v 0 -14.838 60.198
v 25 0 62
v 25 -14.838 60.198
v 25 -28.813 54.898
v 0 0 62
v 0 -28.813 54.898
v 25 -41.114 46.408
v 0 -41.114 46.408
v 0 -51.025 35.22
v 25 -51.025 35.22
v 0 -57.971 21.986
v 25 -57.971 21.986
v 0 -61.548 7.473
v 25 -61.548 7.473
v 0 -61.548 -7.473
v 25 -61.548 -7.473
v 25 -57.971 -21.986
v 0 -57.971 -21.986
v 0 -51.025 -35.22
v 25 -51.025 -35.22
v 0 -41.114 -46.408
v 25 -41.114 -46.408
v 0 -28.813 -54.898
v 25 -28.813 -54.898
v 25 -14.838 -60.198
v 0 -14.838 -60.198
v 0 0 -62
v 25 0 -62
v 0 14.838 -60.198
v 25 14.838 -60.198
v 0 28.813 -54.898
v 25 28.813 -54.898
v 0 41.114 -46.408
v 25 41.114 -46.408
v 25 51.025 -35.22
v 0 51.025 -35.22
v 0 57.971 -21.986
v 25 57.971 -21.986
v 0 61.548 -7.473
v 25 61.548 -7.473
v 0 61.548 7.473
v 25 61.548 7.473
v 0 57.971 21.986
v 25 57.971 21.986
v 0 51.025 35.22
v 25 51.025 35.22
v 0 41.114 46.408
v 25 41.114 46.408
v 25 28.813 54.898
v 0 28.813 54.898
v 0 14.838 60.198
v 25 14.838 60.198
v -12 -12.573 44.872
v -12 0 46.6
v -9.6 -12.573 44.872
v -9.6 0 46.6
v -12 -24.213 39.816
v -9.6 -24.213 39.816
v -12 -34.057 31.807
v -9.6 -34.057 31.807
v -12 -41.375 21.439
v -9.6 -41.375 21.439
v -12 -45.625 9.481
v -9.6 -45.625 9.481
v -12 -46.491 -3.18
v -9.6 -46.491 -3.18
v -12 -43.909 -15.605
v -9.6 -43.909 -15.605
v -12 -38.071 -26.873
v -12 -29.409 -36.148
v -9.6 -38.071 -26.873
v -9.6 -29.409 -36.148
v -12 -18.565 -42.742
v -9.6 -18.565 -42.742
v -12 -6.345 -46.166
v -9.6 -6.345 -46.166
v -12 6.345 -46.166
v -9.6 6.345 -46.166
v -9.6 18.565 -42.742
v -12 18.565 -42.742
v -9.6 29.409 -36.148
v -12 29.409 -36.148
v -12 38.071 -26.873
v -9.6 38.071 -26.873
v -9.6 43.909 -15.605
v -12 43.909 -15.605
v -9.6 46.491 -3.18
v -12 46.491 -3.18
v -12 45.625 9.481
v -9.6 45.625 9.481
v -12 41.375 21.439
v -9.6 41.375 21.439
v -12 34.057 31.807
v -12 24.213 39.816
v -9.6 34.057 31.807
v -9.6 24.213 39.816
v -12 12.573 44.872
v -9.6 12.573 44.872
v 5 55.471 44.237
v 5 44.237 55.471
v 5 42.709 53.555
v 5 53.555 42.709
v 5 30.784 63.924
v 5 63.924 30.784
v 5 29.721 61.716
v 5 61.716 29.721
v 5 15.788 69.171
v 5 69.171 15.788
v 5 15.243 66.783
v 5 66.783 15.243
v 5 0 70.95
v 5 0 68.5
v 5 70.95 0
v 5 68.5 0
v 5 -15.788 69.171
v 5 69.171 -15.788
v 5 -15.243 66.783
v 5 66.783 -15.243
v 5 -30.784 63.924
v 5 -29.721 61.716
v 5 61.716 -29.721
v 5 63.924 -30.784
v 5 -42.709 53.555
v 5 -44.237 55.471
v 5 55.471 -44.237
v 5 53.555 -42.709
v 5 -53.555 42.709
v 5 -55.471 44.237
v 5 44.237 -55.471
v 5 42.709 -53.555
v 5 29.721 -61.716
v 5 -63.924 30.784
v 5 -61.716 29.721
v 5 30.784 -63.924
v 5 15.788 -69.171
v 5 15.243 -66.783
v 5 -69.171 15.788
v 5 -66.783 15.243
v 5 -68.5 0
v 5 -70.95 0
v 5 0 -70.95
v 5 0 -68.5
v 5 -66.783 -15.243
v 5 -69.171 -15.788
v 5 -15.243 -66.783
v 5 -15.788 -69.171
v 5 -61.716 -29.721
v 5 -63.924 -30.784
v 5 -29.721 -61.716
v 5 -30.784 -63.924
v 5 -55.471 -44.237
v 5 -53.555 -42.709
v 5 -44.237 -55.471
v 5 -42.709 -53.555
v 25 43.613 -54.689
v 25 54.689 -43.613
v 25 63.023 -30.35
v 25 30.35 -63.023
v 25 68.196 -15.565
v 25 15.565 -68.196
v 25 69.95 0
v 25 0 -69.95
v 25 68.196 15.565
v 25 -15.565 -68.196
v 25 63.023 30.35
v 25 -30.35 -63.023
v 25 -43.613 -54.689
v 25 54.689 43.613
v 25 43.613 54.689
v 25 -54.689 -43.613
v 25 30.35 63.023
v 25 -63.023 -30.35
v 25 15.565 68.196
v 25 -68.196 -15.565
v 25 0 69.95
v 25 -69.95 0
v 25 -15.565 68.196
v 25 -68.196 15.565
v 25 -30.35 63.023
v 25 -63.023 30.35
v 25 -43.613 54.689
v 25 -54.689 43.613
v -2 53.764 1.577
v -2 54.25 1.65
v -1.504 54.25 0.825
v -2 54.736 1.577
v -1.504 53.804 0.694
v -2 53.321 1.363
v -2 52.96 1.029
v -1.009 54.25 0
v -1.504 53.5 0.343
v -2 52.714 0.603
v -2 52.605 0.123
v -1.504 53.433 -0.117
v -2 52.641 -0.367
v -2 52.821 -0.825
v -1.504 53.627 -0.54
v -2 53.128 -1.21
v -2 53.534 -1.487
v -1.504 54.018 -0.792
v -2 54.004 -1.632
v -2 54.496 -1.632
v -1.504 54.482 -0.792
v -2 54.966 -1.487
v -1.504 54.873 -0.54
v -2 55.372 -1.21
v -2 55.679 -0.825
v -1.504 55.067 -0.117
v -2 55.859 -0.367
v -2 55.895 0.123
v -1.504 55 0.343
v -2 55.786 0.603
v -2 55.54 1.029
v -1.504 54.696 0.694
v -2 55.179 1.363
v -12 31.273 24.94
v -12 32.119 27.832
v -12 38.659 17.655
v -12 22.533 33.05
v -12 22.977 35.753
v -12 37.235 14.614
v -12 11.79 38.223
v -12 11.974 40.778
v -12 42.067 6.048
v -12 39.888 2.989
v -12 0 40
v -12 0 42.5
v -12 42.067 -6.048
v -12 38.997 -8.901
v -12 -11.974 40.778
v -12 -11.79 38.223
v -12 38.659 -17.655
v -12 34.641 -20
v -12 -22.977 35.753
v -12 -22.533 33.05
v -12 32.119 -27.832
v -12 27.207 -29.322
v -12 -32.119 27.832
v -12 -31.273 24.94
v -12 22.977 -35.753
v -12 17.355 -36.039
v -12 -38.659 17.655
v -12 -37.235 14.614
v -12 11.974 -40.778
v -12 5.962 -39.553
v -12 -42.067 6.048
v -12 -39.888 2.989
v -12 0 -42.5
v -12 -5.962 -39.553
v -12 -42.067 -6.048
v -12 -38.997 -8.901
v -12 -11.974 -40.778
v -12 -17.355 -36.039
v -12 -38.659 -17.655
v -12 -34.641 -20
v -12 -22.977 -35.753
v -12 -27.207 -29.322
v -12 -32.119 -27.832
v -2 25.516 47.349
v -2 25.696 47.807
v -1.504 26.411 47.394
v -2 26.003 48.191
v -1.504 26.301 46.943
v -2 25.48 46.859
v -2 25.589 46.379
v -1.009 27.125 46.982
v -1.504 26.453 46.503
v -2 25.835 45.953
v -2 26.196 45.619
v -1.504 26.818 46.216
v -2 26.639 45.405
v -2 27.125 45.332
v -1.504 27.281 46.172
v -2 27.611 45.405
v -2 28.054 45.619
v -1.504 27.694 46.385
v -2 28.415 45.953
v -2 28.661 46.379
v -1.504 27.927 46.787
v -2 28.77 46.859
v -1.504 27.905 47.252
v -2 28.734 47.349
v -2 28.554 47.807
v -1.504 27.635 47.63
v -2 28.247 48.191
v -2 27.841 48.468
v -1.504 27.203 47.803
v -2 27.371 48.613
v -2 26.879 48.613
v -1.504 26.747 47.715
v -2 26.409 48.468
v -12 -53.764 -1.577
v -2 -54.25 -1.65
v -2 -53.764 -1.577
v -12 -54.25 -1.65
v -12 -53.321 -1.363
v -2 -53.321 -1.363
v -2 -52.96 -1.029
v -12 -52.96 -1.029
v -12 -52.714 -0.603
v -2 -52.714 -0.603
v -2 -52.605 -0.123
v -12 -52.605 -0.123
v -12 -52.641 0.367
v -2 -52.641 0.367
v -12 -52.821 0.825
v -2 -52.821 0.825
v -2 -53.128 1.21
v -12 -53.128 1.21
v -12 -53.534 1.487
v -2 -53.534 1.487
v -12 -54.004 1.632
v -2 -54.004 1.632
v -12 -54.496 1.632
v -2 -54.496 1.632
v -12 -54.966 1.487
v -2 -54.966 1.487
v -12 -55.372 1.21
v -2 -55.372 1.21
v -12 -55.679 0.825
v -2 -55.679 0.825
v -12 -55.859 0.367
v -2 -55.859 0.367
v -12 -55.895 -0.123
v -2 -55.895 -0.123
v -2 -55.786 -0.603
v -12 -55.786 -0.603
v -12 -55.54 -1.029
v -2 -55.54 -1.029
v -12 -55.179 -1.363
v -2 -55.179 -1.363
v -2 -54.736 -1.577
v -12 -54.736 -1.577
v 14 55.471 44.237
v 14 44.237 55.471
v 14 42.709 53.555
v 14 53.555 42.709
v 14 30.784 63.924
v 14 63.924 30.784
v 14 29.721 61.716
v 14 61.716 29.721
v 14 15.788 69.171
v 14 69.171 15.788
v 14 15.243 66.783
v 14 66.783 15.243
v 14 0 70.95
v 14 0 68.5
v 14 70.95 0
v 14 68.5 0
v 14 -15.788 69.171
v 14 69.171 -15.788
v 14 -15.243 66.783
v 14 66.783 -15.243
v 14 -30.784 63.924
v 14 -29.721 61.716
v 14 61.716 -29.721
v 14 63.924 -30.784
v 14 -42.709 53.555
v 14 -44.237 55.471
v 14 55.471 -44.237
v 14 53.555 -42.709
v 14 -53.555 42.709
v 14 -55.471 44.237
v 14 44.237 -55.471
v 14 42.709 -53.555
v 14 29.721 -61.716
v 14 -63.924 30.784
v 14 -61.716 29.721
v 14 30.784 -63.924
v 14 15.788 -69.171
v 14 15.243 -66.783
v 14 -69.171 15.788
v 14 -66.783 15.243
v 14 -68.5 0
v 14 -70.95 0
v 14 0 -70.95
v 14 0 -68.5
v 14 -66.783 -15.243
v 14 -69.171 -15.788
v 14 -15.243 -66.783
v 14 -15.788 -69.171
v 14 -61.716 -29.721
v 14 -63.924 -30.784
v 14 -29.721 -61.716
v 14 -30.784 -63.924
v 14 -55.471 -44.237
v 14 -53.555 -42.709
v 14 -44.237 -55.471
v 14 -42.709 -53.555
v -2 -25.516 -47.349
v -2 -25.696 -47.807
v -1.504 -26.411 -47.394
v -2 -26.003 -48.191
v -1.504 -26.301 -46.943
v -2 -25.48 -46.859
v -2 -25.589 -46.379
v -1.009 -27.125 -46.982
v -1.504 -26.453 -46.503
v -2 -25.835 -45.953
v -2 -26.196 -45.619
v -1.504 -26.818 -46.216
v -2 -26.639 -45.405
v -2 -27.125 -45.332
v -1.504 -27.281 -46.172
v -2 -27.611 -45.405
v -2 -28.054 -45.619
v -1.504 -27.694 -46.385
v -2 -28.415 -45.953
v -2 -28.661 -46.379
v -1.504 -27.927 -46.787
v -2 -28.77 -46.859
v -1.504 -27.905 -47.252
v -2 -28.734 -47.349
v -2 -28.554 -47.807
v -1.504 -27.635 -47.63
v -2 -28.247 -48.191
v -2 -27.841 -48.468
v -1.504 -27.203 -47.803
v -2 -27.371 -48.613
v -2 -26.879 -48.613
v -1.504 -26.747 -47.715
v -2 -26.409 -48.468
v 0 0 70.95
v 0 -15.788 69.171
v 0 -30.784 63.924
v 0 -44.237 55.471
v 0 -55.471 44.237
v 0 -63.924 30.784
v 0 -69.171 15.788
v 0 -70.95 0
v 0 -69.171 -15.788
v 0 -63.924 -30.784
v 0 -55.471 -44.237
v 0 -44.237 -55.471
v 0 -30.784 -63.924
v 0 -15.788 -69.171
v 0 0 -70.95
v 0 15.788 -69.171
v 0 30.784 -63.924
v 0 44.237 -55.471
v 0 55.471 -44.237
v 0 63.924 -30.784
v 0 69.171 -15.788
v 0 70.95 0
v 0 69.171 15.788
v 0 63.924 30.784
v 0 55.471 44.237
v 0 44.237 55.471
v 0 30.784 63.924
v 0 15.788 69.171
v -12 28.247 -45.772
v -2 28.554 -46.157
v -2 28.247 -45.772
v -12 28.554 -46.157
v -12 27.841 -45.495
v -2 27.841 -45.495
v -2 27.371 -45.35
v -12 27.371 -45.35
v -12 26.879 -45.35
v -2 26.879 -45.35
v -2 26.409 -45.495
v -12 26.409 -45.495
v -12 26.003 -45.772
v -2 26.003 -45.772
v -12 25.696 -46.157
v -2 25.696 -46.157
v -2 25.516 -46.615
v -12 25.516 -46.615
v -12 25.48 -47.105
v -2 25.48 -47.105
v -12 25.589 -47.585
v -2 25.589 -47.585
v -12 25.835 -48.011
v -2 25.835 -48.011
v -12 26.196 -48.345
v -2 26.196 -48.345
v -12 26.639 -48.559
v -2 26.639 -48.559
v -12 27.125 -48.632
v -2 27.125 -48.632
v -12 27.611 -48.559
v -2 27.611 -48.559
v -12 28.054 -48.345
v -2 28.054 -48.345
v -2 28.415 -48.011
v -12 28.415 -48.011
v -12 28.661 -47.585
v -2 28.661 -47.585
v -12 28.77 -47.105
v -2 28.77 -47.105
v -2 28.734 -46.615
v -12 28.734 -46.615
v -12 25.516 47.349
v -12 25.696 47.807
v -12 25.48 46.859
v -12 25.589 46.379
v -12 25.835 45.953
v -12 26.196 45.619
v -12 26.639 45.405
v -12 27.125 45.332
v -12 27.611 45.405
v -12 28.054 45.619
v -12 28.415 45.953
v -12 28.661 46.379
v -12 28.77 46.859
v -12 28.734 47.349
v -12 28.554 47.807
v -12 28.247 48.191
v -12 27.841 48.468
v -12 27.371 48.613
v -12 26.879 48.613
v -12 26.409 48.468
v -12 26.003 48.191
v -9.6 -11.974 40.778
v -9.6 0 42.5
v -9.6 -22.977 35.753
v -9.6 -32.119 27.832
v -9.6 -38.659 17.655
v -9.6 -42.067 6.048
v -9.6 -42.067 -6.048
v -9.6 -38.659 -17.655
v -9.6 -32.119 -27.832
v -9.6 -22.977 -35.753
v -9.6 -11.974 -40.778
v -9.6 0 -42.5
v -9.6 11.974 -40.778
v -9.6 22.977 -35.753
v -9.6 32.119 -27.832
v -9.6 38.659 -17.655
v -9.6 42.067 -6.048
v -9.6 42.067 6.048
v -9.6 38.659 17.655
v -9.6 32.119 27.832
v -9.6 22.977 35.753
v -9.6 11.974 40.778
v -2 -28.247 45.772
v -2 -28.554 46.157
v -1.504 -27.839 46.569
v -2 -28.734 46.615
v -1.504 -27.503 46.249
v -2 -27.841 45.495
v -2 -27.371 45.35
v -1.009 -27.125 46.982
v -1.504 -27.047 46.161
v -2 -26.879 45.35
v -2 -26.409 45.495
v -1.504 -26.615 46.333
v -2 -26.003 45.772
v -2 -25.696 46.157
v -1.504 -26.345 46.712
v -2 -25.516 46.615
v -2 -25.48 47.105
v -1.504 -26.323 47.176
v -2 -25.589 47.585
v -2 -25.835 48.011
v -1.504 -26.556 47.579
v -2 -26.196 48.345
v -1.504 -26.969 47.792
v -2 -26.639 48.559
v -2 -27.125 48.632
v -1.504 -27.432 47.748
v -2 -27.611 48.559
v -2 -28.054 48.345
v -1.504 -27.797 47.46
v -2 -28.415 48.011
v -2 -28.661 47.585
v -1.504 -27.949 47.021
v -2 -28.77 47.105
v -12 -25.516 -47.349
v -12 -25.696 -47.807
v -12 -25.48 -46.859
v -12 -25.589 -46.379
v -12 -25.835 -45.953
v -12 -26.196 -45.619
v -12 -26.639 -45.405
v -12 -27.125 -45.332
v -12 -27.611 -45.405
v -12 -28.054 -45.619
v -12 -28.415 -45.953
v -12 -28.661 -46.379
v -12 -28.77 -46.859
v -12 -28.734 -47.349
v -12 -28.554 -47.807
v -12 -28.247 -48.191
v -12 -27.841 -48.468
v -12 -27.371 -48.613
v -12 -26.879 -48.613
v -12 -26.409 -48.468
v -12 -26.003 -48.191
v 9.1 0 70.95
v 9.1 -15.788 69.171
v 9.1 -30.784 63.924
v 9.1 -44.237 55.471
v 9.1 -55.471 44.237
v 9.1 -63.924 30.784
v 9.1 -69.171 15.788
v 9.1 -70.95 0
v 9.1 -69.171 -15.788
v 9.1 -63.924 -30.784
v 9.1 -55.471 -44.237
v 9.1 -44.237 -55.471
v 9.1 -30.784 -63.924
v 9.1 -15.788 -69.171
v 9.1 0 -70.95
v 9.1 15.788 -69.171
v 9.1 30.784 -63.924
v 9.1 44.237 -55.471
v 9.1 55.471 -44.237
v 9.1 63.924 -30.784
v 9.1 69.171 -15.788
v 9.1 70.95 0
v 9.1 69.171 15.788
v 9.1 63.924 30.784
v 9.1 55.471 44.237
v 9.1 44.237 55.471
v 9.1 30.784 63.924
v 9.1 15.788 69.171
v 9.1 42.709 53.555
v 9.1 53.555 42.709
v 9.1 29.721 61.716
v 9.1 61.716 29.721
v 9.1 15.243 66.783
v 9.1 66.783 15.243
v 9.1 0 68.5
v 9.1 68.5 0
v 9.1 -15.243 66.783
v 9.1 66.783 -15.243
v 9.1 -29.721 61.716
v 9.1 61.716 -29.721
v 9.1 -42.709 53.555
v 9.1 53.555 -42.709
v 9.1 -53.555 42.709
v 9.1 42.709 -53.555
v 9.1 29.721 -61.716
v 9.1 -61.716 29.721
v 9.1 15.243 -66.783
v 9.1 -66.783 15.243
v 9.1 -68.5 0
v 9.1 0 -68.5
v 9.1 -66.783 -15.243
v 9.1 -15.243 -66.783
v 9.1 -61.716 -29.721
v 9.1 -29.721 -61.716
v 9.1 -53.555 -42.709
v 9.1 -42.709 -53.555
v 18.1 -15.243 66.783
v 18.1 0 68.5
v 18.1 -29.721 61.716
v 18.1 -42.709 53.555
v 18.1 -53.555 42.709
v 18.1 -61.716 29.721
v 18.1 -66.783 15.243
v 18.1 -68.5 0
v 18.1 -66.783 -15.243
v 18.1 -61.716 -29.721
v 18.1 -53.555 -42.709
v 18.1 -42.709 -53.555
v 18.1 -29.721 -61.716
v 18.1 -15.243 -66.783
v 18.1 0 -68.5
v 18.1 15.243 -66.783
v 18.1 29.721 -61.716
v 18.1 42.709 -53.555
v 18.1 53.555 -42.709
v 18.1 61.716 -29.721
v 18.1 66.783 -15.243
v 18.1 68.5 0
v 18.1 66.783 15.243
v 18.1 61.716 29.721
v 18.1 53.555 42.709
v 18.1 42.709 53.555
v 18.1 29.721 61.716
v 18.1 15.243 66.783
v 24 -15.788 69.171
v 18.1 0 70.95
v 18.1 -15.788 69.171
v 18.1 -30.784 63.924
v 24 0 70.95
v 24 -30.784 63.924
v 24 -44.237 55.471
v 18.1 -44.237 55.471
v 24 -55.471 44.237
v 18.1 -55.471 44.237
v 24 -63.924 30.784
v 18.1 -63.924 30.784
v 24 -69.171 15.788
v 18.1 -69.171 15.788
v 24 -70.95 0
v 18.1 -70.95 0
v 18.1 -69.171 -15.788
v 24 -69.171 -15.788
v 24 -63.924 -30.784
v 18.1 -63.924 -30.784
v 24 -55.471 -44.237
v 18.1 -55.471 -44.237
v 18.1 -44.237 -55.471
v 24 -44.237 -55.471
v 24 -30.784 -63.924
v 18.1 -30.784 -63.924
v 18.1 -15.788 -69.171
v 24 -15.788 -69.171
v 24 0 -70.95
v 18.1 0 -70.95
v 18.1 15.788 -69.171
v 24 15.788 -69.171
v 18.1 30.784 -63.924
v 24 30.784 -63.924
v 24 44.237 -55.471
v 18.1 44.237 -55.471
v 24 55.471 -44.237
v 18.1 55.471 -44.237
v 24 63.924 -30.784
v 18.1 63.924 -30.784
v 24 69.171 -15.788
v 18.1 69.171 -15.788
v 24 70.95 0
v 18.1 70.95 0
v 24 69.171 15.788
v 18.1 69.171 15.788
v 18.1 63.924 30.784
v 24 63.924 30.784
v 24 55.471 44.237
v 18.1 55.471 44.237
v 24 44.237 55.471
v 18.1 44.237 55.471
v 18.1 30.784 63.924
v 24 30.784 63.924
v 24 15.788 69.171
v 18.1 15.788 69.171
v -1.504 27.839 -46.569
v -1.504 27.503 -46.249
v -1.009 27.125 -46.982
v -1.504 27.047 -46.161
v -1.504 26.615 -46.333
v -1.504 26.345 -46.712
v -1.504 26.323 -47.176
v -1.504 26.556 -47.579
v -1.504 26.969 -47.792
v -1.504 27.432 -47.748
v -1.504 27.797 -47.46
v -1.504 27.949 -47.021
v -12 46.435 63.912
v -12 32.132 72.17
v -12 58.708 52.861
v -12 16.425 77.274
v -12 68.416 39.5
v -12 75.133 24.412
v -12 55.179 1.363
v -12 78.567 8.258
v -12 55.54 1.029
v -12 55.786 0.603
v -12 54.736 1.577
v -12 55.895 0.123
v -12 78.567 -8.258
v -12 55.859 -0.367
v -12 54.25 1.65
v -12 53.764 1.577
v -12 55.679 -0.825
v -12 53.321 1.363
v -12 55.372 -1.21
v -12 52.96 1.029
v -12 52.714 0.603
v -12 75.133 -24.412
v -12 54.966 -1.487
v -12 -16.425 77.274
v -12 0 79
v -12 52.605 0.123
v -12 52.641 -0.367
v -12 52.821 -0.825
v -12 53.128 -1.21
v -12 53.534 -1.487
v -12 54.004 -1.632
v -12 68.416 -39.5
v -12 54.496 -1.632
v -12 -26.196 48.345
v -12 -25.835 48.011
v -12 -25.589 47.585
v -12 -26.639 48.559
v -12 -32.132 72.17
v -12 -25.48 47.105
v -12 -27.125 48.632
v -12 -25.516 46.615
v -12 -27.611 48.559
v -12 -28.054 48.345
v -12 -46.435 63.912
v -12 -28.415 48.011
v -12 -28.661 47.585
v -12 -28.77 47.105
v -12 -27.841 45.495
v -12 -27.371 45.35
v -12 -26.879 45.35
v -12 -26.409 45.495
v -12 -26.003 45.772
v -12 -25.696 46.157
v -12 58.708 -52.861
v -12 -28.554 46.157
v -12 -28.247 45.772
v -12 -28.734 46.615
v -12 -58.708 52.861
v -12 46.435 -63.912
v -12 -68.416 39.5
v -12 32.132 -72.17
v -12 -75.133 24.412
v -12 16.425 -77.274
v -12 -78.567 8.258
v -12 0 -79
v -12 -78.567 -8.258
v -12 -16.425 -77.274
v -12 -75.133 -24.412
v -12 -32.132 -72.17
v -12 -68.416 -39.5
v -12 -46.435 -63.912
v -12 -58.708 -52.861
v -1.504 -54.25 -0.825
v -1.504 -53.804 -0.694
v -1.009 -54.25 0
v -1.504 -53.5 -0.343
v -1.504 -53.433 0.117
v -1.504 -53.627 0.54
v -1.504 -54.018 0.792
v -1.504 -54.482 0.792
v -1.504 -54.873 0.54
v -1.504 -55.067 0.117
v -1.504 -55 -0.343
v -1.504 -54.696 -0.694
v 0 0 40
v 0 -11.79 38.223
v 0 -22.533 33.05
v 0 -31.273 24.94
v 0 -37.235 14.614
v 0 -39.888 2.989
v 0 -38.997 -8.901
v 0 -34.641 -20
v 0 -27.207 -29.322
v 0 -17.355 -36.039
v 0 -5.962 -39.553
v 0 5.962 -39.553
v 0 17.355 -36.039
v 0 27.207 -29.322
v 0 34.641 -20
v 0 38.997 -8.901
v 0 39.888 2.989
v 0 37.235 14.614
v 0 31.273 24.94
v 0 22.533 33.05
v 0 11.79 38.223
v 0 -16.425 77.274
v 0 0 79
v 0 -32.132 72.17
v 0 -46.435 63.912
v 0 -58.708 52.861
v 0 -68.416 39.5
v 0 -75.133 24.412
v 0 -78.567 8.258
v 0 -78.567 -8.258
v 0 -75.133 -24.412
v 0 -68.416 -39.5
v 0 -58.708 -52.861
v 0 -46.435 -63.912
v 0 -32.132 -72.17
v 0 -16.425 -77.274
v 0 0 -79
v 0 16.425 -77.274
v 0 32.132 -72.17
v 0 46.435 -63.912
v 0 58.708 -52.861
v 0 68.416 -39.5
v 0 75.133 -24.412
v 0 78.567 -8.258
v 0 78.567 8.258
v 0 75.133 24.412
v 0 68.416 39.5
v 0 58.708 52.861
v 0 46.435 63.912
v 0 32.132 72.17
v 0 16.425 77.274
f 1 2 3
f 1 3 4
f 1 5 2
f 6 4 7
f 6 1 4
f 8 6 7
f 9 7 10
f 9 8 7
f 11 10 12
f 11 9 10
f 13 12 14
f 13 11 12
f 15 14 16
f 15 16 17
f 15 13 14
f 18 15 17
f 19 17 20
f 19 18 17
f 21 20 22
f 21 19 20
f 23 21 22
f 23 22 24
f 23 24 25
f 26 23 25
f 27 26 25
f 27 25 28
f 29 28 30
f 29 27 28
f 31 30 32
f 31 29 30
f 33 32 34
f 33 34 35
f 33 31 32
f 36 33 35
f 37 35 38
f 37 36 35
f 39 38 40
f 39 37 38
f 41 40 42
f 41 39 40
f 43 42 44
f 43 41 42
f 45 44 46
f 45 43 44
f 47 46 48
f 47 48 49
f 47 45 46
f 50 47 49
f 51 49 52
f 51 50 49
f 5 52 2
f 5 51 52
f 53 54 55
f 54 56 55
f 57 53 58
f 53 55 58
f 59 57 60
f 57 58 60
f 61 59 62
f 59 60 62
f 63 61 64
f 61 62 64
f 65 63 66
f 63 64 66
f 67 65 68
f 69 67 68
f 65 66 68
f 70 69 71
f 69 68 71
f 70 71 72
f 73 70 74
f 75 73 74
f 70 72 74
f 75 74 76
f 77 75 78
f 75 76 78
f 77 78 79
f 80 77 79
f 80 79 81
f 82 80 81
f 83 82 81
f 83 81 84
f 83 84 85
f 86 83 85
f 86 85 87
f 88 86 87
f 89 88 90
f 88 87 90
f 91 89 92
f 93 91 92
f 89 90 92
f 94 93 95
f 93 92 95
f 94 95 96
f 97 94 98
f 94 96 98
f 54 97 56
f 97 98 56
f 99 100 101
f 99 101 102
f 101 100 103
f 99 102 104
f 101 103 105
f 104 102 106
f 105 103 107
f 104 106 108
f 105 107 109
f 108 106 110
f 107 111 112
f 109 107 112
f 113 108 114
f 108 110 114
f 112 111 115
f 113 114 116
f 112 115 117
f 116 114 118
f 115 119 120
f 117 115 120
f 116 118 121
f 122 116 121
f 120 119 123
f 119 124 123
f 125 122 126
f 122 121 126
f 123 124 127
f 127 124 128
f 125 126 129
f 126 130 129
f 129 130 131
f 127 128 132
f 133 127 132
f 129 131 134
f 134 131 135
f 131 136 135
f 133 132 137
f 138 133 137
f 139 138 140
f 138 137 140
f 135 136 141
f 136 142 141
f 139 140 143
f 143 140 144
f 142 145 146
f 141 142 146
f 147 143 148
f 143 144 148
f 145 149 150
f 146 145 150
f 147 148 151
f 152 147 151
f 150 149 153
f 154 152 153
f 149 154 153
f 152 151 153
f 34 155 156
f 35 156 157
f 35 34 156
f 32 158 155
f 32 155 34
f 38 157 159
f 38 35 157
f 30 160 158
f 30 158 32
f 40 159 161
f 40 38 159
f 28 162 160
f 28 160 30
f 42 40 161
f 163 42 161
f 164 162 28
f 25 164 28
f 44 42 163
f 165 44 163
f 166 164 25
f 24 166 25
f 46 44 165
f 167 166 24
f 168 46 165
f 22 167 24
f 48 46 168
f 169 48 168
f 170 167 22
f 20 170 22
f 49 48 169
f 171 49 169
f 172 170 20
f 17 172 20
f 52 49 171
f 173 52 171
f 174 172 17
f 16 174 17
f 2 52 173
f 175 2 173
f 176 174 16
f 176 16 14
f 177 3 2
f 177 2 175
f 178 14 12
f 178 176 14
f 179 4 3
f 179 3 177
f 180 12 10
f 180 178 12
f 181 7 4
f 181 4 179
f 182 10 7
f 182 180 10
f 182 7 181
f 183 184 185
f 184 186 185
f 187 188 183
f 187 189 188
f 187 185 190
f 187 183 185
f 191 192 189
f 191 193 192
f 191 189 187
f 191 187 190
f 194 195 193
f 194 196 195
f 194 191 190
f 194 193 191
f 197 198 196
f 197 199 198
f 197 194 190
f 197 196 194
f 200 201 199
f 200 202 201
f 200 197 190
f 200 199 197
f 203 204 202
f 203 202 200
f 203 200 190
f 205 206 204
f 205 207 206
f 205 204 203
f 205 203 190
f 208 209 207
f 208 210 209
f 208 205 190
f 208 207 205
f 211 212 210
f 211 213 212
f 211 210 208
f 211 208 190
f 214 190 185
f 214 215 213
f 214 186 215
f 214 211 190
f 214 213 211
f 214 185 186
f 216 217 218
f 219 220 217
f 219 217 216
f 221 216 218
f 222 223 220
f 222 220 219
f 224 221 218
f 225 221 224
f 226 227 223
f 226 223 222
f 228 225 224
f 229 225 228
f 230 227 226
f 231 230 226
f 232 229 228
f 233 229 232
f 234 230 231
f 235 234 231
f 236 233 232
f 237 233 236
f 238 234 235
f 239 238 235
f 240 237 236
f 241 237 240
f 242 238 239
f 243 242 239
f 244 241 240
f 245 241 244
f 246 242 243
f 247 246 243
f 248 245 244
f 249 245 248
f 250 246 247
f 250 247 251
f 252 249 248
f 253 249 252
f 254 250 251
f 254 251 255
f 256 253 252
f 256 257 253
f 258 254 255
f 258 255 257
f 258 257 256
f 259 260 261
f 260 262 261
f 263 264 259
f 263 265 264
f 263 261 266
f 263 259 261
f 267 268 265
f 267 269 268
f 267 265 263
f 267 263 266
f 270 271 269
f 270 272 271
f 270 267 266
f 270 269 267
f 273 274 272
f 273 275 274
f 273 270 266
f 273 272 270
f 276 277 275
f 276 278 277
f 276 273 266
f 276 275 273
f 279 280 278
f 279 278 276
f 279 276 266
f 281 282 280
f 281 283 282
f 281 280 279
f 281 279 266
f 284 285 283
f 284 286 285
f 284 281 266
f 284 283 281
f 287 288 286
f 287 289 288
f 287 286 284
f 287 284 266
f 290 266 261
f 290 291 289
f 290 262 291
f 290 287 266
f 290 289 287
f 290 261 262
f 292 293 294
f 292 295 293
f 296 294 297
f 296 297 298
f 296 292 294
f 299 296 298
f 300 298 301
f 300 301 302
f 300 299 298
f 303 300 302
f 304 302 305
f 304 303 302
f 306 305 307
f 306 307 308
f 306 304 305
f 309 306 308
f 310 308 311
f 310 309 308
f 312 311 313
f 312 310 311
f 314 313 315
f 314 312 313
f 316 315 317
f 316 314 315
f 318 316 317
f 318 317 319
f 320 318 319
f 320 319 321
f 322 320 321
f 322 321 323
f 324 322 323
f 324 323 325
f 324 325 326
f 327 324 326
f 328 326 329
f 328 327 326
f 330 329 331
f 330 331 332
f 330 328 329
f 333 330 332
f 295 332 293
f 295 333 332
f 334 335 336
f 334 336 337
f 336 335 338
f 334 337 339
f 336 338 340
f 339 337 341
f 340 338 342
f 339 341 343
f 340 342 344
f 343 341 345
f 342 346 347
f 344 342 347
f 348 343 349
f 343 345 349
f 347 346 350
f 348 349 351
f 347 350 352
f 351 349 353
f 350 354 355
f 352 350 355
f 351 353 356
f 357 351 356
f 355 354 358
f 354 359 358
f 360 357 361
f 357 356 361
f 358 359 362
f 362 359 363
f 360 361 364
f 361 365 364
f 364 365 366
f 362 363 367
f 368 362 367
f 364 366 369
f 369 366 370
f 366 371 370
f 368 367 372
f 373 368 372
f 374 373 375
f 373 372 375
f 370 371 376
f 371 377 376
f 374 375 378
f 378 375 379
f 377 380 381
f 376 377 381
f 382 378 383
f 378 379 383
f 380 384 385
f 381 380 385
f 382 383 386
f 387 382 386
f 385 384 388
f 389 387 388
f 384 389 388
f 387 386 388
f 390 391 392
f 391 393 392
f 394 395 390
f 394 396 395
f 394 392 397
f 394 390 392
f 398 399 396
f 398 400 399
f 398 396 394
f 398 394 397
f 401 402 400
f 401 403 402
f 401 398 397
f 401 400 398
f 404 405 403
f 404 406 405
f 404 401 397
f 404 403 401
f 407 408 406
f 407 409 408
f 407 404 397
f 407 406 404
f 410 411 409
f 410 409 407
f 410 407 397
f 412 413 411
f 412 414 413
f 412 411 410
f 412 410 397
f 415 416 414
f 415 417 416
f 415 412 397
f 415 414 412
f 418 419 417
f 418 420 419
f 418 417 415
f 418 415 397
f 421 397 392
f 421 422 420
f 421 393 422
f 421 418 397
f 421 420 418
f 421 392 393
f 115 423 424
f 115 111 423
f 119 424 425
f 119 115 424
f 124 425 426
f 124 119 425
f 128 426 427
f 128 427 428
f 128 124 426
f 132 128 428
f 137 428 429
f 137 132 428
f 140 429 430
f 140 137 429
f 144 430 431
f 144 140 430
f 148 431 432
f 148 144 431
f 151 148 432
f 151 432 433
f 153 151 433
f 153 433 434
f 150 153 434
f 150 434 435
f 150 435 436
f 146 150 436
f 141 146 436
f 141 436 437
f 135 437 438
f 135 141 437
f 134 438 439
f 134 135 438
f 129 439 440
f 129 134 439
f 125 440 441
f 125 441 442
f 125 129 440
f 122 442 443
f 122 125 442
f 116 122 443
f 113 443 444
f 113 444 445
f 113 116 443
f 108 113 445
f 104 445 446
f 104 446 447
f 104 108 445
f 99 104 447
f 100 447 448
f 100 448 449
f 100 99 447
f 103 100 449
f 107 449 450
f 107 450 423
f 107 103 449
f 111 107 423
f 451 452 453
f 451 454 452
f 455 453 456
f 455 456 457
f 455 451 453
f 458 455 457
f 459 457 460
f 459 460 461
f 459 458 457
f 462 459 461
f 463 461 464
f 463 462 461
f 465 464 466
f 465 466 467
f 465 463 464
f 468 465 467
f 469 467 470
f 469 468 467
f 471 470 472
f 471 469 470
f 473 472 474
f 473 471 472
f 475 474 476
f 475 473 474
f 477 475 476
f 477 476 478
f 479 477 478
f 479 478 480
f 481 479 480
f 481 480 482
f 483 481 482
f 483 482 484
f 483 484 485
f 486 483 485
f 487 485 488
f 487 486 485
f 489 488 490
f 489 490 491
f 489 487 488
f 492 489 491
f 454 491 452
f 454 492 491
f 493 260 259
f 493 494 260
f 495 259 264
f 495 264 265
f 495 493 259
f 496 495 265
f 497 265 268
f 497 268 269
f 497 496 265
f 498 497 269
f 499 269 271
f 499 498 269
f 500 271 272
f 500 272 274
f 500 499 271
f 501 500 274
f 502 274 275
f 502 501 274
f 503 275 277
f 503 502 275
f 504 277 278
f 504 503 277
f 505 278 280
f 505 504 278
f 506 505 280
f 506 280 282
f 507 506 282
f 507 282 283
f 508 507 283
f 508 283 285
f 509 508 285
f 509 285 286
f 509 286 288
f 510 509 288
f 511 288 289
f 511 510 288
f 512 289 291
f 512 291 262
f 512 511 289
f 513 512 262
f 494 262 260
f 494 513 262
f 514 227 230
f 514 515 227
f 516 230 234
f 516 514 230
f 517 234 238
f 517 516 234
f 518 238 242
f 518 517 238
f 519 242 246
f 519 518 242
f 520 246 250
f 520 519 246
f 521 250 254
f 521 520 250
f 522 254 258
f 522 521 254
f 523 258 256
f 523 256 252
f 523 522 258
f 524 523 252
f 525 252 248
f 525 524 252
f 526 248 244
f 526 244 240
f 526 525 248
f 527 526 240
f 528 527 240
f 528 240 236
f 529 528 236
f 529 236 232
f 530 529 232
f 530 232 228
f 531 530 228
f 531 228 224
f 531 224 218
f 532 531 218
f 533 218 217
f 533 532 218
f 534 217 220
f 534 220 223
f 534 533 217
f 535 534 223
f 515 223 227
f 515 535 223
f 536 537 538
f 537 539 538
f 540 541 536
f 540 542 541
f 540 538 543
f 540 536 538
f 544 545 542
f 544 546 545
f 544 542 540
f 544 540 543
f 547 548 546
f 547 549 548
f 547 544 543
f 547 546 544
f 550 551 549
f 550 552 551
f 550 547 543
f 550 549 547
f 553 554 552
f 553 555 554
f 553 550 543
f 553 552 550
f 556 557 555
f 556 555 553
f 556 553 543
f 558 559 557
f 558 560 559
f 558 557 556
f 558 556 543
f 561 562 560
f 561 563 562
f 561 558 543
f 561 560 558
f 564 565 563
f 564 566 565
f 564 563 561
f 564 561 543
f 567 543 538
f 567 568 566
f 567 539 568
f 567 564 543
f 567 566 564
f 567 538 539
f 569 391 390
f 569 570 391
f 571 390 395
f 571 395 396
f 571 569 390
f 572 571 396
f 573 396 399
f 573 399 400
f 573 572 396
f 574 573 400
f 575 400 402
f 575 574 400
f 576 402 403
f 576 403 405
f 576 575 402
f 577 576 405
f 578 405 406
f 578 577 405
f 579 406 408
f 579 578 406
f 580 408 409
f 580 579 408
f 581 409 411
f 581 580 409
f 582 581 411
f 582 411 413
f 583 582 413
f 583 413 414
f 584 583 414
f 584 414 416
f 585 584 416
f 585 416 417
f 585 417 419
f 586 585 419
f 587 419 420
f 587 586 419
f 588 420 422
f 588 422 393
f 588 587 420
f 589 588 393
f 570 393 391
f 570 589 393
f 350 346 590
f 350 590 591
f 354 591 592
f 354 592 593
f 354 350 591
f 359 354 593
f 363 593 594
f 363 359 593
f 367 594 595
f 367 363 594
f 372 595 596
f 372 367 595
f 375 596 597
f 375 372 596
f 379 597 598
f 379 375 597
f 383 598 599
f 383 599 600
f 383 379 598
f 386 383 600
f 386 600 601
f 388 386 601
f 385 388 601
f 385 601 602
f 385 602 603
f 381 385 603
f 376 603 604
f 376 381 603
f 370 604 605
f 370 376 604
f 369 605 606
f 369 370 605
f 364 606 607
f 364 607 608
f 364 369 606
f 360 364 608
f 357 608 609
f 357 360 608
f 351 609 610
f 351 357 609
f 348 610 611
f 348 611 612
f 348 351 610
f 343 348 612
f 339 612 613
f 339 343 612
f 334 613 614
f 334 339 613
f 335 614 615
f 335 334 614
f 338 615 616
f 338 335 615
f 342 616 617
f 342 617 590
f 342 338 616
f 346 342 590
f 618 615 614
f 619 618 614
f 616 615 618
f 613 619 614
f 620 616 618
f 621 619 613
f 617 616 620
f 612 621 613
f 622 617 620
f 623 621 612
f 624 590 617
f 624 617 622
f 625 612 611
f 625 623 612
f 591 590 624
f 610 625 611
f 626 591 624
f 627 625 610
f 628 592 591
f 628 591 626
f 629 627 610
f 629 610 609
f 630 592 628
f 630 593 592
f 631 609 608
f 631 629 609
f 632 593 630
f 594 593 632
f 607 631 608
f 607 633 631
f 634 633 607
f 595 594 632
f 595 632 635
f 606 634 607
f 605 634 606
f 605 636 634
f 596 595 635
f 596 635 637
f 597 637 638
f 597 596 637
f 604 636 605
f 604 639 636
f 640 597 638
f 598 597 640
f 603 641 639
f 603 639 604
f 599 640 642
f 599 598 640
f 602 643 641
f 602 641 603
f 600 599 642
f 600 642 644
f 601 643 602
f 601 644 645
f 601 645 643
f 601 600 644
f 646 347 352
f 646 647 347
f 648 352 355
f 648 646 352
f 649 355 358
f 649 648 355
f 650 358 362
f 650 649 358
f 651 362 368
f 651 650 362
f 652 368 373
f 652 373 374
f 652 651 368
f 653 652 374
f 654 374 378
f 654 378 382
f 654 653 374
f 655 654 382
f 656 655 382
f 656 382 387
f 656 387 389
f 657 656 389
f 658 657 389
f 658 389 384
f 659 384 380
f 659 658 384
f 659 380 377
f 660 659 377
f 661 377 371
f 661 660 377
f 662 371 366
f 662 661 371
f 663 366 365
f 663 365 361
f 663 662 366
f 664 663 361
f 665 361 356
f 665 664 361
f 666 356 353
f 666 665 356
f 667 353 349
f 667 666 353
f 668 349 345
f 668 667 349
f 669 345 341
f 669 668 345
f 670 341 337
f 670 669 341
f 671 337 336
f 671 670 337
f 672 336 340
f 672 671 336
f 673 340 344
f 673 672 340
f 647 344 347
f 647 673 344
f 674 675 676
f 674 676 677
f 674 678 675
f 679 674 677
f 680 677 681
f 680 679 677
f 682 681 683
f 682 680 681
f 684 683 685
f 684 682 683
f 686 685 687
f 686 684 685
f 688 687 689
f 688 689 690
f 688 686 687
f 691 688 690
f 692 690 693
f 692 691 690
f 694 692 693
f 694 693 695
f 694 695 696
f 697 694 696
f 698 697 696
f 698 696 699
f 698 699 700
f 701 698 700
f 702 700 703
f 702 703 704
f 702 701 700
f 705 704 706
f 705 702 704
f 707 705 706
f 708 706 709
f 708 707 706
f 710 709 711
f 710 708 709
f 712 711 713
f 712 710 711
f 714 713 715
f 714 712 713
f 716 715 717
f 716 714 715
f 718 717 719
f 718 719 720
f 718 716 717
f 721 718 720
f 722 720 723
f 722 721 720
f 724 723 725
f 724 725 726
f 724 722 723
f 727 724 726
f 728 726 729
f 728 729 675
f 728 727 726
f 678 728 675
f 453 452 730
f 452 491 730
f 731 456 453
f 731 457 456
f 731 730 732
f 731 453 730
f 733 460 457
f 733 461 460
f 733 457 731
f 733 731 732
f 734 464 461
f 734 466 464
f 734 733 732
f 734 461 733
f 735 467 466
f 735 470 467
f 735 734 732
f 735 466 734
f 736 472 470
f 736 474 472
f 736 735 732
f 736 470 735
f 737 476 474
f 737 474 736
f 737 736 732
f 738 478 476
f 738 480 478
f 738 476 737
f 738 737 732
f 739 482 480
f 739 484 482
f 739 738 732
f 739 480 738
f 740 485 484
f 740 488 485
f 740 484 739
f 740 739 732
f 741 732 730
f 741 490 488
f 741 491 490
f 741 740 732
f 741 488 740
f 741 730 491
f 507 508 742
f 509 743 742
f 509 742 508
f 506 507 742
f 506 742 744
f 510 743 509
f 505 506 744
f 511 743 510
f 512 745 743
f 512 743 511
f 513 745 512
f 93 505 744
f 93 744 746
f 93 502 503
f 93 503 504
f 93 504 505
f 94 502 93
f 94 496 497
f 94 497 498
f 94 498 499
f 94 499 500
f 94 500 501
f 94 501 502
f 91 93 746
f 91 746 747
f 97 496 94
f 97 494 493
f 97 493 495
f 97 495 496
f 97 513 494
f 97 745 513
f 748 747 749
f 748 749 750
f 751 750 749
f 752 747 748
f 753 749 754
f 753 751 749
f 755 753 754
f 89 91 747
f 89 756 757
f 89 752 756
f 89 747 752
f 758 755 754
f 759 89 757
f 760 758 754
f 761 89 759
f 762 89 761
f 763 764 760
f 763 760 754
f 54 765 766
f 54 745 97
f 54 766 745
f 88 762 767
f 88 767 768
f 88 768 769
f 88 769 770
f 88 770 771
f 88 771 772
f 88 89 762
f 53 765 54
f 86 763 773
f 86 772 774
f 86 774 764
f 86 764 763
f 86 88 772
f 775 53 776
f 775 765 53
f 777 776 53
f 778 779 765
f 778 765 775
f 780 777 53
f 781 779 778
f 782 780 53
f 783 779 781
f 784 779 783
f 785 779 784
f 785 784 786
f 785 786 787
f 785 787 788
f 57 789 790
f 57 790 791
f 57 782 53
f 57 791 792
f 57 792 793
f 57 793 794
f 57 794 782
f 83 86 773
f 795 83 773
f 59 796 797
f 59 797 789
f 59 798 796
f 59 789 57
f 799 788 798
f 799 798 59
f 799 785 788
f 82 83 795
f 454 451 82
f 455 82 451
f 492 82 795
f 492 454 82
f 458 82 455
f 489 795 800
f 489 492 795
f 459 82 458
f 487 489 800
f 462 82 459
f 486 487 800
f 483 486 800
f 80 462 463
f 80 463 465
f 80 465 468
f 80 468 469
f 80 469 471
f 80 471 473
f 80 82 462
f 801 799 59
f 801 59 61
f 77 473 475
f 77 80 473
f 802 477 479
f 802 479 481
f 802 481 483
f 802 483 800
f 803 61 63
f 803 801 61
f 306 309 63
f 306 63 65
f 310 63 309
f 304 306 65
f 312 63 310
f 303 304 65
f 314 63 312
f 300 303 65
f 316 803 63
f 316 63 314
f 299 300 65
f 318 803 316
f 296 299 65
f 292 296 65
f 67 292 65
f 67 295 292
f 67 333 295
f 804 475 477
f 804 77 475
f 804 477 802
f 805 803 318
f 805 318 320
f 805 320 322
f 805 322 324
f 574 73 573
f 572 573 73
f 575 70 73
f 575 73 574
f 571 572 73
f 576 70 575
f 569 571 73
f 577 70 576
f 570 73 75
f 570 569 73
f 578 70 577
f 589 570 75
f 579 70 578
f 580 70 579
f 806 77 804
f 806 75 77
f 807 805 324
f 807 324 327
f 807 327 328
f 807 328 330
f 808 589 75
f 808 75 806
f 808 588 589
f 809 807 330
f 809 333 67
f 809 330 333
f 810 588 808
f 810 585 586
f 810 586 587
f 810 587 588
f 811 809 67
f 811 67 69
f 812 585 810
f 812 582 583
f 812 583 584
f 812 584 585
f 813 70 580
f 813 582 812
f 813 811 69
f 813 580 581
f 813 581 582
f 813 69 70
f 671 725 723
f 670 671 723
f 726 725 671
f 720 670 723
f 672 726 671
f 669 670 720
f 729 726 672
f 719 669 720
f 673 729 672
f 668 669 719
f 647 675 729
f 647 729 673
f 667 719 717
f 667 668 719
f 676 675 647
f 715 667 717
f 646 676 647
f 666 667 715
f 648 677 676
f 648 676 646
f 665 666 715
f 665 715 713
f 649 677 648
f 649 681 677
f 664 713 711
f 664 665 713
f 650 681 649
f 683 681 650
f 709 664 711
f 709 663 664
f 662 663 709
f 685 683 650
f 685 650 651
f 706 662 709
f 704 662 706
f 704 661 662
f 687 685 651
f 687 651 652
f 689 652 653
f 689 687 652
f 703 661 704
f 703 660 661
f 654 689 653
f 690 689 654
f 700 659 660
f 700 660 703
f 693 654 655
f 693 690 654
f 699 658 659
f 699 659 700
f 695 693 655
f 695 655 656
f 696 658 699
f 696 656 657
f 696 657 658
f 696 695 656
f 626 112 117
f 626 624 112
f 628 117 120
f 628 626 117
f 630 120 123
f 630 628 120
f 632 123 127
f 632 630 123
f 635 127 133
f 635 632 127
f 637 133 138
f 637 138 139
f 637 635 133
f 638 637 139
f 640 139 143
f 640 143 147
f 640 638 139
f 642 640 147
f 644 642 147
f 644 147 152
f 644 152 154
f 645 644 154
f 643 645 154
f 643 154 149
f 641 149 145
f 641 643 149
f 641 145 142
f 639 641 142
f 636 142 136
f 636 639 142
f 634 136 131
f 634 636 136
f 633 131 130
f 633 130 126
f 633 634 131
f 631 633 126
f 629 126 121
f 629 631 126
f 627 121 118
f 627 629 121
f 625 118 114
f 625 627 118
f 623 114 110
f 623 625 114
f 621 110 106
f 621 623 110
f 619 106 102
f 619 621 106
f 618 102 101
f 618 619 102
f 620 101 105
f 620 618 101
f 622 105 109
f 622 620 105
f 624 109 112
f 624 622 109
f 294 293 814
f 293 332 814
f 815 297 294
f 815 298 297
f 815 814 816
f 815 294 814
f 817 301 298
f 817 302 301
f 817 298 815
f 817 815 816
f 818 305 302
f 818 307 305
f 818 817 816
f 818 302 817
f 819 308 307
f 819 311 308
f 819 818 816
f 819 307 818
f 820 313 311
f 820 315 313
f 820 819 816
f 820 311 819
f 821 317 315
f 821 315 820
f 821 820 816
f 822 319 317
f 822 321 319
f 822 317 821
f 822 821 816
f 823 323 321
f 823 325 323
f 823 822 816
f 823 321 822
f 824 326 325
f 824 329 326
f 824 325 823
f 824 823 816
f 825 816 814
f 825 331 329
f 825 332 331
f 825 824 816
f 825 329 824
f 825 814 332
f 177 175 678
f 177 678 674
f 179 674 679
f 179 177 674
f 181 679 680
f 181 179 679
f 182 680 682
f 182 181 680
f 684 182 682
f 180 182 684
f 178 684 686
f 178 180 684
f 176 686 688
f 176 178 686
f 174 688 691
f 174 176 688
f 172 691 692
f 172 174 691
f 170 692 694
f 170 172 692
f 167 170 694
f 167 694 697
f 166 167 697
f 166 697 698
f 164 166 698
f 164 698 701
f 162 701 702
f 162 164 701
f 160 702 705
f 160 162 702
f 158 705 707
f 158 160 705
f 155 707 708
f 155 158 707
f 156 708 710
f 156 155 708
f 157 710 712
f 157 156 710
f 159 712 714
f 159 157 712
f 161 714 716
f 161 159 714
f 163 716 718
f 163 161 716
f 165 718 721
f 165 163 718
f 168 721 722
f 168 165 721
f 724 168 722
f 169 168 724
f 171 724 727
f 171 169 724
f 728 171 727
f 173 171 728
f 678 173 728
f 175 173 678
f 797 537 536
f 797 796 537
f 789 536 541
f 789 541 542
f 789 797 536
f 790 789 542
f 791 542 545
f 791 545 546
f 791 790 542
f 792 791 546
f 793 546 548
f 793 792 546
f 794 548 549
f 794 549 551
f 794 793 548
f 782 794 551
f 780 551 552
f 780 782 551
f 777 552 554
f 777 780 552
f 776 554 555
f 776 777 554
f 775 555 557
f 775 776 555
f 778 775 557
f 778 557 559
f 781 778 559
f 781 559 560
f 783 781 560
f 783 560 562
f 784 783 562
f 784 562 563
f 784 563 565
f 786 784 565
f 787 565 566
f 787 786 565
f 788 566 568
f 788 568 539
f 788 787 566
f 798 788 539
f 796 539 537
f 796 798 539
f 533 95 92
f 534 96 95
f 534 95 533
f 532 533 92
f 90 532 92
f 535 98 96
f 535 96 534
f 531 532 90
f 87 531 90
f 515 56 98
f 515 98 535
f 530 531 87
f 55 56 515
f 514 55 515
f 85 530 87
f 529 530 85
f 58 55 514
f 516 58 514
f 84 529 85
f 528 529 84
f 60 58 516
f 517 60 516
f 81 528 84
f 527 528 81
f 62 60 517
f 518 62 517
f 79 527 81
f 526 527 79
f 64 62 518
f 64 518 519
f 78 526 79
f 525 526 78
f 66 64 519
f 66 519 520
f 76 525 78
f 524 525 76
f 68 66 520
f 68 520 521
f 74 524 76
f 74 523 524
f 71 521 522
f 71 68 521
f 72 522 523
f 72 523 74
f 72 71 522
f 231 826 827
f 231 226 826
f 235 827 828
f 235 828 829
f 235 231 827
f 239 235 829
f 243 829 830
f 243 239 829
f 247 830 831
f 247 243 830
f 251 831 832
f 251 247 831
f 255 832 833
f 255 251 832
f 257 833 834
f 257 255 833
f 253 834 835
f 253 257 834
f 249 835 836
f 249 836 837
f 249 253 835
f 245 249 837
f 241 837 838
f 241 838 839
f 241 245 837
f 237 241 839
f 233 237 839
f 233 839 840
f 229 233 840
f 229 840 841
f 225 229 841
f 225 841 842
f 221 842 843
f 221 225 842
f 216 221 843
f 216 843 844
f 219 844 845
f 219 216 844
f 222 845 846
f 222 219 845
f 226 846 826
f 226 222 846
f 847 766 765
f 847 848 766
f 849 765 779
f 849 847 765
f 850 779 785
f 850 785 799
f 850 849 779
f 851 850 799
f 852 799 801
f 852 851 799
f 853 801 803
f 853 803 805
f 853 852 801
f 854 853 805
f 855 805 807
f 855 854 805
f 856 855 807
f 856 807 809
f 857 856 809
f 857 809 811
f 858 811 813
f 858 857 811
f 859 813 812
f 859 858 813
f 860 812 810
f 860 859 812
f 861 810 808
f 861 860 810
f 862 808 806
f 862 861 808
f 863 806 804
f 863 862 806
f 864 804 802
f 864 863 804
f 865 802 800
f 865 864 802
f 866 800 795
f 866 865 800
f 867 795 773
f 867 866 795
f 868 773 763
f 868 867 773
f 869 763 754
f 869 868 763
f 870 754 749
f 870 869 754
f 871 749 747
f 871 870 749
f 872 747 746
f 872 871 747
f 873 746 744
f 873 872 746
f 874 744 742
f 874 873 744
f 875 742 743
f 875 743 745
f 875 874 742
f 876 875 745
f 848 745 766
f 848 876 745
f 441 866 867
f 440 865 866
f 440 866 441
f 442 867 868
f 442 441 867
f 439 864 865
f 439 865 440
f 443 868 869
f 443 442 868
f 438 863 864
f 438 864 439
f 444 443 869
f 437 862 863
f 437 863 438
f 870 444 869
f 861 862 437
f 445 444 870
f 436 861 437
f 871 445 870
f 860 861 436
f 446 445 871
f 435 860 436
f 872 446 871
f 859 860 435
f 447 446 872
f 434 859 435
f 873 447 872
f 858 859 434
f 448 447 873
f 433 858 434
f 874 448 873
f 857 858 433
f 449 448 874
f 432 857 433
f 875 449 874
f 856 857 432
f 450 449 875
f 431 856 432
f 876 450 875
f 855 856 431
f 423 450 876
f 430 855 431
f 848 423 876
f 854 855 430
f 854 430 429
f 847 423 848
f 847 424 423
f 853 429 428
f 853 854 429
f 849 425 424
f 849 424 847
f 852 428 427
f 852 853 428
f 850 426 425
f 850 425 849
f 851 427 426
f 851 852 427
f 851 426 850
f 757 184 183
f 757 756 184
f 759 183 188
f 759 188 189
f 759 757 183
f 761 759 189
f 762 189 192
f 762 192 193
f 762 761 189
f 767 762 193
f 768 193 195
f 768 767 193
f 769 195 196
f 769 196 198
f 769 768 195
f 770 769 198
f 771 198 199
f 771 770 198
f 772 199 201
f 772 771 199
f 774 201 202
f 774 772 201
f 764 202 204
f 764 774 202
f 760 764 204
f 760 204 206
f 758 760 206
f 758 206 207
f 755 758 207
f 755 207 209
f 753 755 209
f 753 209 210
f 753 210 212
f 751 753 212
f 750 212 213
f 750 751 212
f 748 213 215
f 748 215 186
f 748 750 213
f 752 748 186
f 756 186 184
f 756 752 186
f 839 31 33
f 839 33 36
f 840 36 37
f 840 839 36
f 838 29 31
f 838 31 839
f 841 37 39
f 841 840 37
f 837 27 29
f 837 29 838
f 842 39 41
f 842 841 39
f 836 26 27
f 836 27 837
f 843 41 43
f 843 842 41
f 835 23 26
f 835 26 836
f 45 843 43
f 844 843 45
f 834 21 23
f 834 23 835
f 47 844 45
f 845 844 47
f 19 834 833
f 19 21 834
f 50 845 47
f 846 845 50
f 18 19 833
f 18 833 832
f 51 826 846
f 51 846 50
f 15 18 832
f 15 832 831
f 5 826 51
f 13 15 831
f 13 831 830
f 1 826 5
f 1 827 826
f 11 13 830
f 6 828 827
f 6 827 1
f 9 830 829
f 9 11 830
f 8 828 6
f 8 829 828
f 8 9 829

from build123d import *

# Parameters (mm, degrees)
CHAMFER_988_SIZE          = 1
SKETCH_2_W                = 4.1
SKETCH_2_H                = 2.45
PATTERN_LINEAR_O_2_COUNT  = 2
PATTERN_LINEAR_O_2_PITCH  = 9
SKETCH_3_W                = 2.4
SKETCH_3_H                = 4.1
PATTERN_CIRCULAR_M4_COUNT = 6


with BuildPart() as part:
    # ｽｹｯﾁ1 → Revolve 949 (revolve)
    with BuildSketch(Plane.XY):
        Polygon((-12, 40), (-12, 79), (0, 79), (0, 70.95), (25, 70.95), (25, 62), (0, 62), (0, 40), align=None)
    revolve(axis=Axis((0, 0, 0), (1, 0, 0)))

    # Chamfer 988
    chamfer_988_edges = [part.edges().sort_by_distance(p)[0] for p in [
        (25, -70.95, 0),
    ]]
    chamfer(chamfer_988_edges, length=CHAMFER_988_SIZE)

    # ｽｹｯﾁ2 → Oリング溝入れ G-135 (revolve, cut)
    with BuildSketch(Plane.XY):
        with Locations((7.05, 69.725)):
            Rectangle(SKETCH_2_W, SKETCH_2_H)
    o_g_135 = revolve(axis=Axis((0, 0, 0), (1, 0, 0)), mode=Mode.SUBTRACT)

    # Oリング溝 2 本目: Oリング溝入れ G-135 ×2
    with Locations(*[(i * PATTERN_LINEAR_O_2_PITCH, 0, 0) for i in range(1, PATTERN_LINEAR_O_2_COUNT)]):
        add(o_g_135, mode=Mode.SUBTRACT)

    # ｽｹｯﾁ3 → 窓 Oリング溝入れ G-85 (revolve, cut)
    with BuildSketch(Plane.XY):
        with Locations((-10.8, 44.55)):
            Rectangle(SKETCH_3_W, SKETCH_3_H)
    revolve(axis=Axis((0, 0, 0), (1, 0, 0)), mode=Mode.SUBTRACT)

    # ｽｹｯﾁ4 → M4 めねじ (revolve, cut)
    with BuildSketch(Plane(origin=(-12, 54.25, 0), x_dir=(0, 0, 1), z_dir=(0, 1, 0))):
        Polygon((0, 0), (0, 10.991420021), (1.65, 10), (1.65, 0), align=None)
    hole_wizard_m4 = revolve(axis=Axis((-18.35, 54.25, 0), (1, 0, 0)), mode=Mode.SUBTRACT)

    # M4 めねじ 等配: M4 めねじ ×6 about axis
    pattern_circular_m4_axis = Axis((-14.35, 0, 0), (1, 0, 0))
    for i in range(1, PATTERN_CIRCULAR_M4_COUNT):
        add(hole_wizard_m4.rotate(pattern_circular_m4_axis, i * 360 / PATTERN_CIRCULAR_M4_COUNT), mode=Mode.SUBTRACT)


solid = part.part
